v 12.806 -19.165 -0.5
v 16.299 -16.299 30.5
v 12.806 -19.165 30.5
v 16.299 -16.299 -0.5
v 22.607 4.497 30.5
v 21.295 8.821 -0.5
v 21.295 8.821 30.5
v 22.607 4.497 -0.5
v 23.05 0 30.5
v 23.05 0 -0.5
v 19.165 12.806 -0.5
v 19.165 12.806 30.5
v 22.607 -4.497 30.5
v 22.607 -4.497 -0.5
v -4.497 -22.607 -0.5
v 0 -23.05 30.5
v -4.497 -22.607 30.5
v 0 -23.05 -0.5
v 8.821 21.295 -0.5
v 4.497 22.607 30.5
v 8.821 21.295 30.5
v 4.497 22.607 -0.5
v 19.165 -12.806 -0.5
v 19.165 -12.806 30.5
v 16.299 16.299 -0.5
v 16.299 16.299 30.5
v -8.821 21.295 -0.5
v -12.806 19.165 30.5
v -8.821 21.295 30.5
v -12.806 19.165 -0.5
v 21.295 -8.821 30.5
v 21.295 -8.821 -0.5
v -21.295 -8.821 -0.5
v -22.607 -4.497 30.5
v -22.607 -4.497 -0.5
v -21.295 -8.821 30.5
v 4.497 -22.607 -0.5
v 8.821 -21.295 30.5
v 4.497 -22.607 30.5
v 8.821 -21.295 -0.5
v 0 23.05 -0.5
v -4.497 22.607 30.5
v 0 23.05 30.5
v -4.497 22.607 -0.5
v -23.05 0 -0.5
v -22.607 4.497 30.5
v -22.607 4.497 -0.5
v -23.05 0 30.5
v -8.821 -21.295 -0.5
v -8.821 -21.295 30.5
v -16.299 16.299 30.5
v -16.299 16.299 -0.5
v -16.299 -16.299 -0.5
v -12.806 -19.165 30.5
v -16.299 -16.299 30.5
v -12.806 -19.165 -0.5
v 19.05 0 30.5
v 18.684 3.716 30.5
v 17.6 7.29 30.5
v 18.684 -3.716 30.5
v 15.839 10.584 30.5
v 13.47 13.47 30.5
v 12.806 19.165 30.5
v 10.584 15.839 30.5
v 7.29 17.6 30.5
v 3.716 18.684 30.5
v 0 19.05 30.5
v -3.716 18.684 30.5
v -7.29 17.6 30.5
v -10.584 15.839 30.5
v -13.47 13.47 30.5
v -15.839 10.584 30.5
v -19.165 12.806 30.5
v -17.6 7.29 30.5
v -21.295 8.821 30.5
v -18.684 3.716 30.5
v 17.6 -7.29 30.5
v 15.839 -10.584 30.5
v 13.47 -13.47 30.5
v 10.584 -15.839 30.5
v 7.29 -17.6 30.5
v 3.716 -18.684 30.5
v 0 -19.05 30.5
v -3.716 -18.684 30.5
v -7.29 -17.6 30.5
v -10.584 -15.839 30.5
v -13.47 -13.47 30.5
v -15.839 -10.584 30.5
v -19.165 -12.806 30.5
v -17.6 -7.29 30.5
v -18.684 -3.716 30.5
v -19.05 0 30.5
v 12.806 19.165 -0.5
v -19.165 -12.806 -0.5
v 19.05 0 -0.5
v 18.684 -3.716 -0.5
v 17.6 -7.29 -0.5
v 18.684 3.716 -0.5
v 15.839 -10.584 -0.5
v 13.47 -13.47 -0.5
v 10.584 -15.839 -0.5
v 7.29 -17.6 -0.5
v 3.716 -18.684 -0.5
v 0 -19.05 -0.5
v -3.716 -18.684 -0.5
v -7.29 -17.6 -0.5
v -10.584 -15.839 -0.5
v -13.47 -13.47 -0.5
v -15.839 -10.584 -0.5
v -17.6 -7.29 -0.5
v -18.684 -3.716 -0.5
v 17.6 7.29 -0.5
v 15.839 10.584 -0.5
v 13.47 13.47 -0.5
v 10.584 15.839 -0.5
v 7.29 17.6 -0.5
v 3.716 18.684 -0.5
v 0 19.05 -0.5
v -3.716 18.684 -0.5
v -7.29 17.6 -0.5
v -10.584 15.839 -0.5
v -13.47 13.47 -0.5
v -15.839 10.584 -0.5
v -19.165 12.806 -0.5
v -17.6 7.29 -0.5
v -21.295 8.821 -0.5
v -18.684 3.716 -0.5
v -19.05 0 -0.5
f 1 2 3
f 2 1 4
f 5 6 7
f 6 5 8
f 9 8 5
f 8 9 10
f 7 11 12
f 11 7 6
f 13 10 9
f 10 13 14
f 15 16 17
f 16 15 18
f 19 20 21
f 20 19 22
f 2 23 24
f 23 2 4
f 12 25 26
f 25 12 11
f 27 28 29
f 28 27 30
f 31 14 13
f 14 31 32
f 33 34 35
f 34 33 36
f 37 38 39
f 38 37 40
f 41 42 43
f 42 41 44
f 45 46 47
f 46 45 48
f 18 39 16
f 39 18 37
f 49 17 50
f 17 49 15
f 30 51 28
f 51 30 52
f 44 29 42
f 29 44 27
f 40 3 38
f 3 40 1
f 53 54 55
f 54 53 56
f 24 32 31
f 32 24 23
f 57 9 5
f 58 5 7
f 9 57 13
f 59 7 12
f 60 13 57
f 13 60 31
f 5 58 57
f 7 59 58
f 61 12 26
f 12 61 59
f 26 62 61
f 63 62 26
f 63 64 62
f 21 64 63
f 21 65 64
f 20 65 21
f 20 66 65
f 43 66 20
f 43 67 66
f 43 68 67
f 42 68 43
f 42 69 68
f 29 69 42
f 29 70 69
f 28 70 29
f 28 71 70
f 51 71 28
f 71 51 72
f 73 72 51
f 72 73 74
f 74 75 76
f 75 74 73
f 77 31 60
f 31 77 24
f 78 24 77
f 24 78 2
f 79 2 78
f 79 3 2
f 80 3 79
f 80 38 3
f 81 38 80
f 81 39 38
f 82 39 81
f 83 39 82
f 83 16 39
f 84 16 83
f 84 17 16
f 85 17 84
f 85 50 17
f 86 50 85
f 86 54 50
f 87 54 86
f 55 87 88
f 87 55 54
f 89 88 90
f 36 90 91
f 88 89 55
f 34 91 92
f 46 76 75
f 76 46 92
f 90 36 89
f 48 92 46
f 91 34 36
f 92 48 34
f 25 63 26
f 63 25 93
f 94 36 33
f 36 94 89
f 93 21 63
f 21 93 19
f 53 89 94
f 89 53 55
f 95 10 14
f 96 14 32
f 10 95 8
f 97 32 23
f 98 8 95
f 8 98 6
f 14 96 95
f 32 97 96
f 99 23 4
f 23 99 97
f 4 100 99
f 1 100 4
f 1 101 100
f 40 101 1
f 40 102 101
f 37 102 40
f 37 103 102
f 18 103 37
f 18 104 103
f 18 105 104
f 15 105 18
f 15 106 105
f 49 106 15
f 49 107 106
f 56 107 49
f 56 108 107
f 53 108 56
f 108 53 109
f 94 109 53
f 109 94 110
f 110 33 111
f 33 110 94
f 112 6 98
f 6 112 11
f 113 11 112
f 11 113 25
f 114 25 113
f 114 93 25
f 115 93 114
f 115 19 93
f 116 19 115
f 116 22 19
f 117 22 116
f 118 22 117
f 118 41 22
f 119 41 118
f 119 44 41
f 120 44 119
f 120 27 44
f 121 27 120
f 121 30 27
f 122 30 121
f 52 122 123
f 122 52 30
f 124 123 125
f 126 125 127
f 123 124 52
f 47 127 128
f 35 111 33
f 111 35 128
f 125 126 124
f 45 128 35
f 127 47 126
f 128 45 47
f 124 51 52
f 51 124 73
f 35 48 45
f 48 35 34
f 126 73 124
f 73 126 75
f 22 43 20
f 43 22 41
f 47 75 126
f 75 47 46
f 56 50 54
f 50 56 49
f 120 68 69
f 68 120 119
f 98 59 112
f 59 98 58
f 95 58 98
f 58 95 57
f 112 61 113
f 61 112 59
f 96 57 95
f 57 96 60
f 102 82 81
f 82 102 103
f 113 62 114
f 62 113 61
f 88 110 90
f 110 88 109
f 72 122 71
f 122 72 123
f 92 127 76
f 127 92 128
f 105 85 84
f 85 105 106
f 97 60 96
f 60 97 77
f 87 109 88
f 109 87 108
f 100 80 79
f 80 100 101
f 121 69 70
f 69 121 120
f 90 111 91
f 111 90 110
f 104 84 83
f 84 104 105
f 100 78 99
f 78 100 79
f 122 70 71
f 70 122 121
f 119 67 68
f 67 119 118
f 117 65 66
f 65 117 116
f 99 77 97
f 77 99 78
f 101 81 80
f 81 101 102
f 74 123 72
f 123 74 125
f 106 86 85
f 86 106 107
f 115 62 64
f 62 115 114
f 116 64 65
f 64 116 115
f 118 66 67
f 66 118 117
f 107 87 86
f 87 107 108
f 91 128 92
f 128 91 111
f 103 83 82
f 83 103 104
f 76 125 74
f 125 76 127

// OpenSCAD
$fn = 32;

// ----------------------------------------------------------------------
// Two-module gear rim: z12 m2 and z12 m2, 30 mm wide
// ----------------------------------------------------------------------

// --- parameters (mm) ---
module_a = 2;             // first tooth module
teeth_a = 12;             // first band tooth count
module_b = 2;             // second tooth module
teeth_b = 12;             // second band tooth count
band_h = 12;              // height of one tooth band
web_t = 6;                // web thickness between the bands
total = 30;               // overall width over both bands
root_r = 9.5;             // root radius of the coarse band
hub_r = 23.05;            // hub radius
bore_d = 38.1;            // hub bore
hole_count = 4;           // lightening holes
hole_r = 7.75;            // lightening hole circle radius
hole_d = 4;               // lightening hole diameter

band_a = [[9.4, -1.378], [12.124, -1.51], [13.058, -1.154], [13.986, -0.621], [13.986, 0.621], [13.058, 1.154], [12.124, 1.51], [9.4, 1.378], [8.829, 3.507], [11.254, 4.755], [11.885, 5.53], [12.423, 6.456], [11.802, 7.531], [10.732, 7.528], [9.745, 7.369], [7.451, 5.893], [5.893, 7.451], [7.369, 9.745], [7.528, 10.732], [7.531, 11.802], [6.456, 12.423], [5.53, 11.885], [4.755, 11.254], [3.507, 8.829], [1.378, 9.4], [1.51, 12.124], [1.154, 13.058], [0.621, 13.986], [-0.621, 13.986], [-1.154, 13.058], [-1.51, 12.124], [-1.378, 9.4], [-3.507, 8.829], [-4.755, 11.254], [-5.53, 11.885], [-6.456, 12.423], [-7.531, 11.802], [-7.528, 10.732], [-7.369, 9.745], [-5.893, 7.451], [-7.451, 5.893], [-9.745, 7.369], [-10.732, 7.528], [-11.802, 7.531], [-12.423, 6.456], [-11.885, 5.53], [-11.254, 4.755], [-8.829, 3.507], [-9.4, 1.378], [-12.124, 1.51], [-13.058, 1.154], [-13.986, 0.621], [-13.986, -0.621], [-13.058, -1.154], [-12.124, -1.51], [-9.4, -1.378], [-8.829, -3.507], [-11.254, -4.755], [-11.885, -5.53], [-12.423, -6.456], [-11.802, -7.531], [-10.732, -7.528], [-9.745, -7.369], [-7.451, -5.893], [-5.893, -7.451], [-7.369, -9.745], [-7.528, -10.732], [-7.531, -11.802], [-6.456, -12.423], [-5.53, -11.885], [-4.755, -11.254], [-3.507, -8.829], [-1.378, -9.4], [-1.51, -12.124], [-1.154, -13.058], [-0.621, -13.986], [0.621, -13.986], [1.154, -13.058], [1.51, -12.124], [1.378, -9.4], [3.507, -8.829], [4.755, -11.254], [5.53, -11.885], [6.456, -12.423], [7.531, -11.802], [7.528, -10.732], [7.369, -9.745], [5.893, -7.451], [7.451, -5.893], [9.745, -7.369], [10.732, -7.528], [11.802, -7.531], [12.423, -6.456], [11.885, -5.53], [11.254, -4.755], [8.829, -3.507]];
band_b = [[9.4, -1.378], [12.124, -1.51], [13.058, -1.154], [13.986, -0.621], [13.986, 0.621], [13.058, 1.154], [12.124, 1.51], [9.4, 1.378], [8.829, 3.507], [11.254, 4.755], [11.885, 5.53], [12.423, 6.456], [11.802, 7.531], [10.732, 7.528], [9.745, 7.369], [7.451, 5.893], [5.893, 7.451], [7.369, 9.745], [7.528, 10.732], [7.531, 11.802], [6.456, 12.423], [5.53, 11.885], [4.755, 11.254], [3.507, 8.829], [1.378, 9.4], [1.51, 12.124], [1.154, 13.058], [0.621, 13.986], [-0.621, 13.986], [-1.154, 13.058], [-1.51, 12.124], [-1.378, 9.4], [-3.507, 8.829], [-4.755, 11.254], [-5.53, 11.885], [-6.456, 12.423], [-7.531, 11.802], [-7.528, 10.732], [-7.369, 9.745], [-5.893, 7.451], [-7.451, 5.893], [-9.745, 7.369], [-10.732, 7.528], [-11.802, 7.531], [-12.423, 6.456], [-11.885, 5.53], [-11.254, 4.755], [-8.829, 3.507], [-9.4, 1.378], [-12.124, 1.51], [-13.058, 1.154], [-13.986, 0.621], [-13.986, -0.621], [-13.058, -1.154], [-12.124, -1.51], [-9.4, -1.378], [-8.829, -3.507], [-11.254, -4.755], [-11.885, -5.53], [-12.423, -6.456], [-11.802, -7.531], [-10.732, -7.528], [-9.745, -7.369], [-7.451, -5.893], [-5.893, -7.451], [-7.369, -9.745], [-7.528, -10.732], [-7.531, -11.802], [-6.456, -12.423], [-5.53, -11.885], [-4.755, -11.254], [-3.507, -8.829], [-1.378, -9.4], [-1.51, -12.124], [-1.154, -13.058], [-0.621, -13.986], [0.621, -13.986], [1.154, -13.058], [1.51, -12.124], [1.378, -9.4], [3.507, -8.829], [4.755, -11.254], [5.53, -11.885], [6.456, -12.423], [7.531, -11.802], [7.528, -10.732], [7.369, -9.745], [5.893, -7.451], [7.451, -5.893], [9.745, -7.369], [10.732, -7.528], [11.802, -7.531], [12.423, -6.456], [11.885, -5.53], [11.254, -4.755], [8.829, -3.507]];

difference() {
  union() {
    /* tooth band A, overlapping the web by 0.4 mm */
    linear_extrude(height = band_h + 0.4) polygon(band_a);
    /* web */
    translate([0, 0, band_h - 0.4]) cylinder(h = web_t + 0.8, d = 2 * root_r);
    /* tooth band B */
    translate([0, 0, band_h + web_t]) linear_extrude(height = band_h + 0.4) polygon(band_b);
    /* hub */
    translate([0, 0, -0.5]) cylinder(h = total + 1.0, d = 2 * hub_r);
  }
  /* bore */
  translate([0, 0, -2.5]) cylinder(h = total + 5, d = bore_d);
  /* lightening holes through the web */
  for (i = [0 : hole_count - 1]) {
    a = i * 360 / hole_count;
    translate([hole_r * cos(a), hole_r * sin(a), -2.5]) cylinder(h = total + 5, d = hole_d);
  }
}
